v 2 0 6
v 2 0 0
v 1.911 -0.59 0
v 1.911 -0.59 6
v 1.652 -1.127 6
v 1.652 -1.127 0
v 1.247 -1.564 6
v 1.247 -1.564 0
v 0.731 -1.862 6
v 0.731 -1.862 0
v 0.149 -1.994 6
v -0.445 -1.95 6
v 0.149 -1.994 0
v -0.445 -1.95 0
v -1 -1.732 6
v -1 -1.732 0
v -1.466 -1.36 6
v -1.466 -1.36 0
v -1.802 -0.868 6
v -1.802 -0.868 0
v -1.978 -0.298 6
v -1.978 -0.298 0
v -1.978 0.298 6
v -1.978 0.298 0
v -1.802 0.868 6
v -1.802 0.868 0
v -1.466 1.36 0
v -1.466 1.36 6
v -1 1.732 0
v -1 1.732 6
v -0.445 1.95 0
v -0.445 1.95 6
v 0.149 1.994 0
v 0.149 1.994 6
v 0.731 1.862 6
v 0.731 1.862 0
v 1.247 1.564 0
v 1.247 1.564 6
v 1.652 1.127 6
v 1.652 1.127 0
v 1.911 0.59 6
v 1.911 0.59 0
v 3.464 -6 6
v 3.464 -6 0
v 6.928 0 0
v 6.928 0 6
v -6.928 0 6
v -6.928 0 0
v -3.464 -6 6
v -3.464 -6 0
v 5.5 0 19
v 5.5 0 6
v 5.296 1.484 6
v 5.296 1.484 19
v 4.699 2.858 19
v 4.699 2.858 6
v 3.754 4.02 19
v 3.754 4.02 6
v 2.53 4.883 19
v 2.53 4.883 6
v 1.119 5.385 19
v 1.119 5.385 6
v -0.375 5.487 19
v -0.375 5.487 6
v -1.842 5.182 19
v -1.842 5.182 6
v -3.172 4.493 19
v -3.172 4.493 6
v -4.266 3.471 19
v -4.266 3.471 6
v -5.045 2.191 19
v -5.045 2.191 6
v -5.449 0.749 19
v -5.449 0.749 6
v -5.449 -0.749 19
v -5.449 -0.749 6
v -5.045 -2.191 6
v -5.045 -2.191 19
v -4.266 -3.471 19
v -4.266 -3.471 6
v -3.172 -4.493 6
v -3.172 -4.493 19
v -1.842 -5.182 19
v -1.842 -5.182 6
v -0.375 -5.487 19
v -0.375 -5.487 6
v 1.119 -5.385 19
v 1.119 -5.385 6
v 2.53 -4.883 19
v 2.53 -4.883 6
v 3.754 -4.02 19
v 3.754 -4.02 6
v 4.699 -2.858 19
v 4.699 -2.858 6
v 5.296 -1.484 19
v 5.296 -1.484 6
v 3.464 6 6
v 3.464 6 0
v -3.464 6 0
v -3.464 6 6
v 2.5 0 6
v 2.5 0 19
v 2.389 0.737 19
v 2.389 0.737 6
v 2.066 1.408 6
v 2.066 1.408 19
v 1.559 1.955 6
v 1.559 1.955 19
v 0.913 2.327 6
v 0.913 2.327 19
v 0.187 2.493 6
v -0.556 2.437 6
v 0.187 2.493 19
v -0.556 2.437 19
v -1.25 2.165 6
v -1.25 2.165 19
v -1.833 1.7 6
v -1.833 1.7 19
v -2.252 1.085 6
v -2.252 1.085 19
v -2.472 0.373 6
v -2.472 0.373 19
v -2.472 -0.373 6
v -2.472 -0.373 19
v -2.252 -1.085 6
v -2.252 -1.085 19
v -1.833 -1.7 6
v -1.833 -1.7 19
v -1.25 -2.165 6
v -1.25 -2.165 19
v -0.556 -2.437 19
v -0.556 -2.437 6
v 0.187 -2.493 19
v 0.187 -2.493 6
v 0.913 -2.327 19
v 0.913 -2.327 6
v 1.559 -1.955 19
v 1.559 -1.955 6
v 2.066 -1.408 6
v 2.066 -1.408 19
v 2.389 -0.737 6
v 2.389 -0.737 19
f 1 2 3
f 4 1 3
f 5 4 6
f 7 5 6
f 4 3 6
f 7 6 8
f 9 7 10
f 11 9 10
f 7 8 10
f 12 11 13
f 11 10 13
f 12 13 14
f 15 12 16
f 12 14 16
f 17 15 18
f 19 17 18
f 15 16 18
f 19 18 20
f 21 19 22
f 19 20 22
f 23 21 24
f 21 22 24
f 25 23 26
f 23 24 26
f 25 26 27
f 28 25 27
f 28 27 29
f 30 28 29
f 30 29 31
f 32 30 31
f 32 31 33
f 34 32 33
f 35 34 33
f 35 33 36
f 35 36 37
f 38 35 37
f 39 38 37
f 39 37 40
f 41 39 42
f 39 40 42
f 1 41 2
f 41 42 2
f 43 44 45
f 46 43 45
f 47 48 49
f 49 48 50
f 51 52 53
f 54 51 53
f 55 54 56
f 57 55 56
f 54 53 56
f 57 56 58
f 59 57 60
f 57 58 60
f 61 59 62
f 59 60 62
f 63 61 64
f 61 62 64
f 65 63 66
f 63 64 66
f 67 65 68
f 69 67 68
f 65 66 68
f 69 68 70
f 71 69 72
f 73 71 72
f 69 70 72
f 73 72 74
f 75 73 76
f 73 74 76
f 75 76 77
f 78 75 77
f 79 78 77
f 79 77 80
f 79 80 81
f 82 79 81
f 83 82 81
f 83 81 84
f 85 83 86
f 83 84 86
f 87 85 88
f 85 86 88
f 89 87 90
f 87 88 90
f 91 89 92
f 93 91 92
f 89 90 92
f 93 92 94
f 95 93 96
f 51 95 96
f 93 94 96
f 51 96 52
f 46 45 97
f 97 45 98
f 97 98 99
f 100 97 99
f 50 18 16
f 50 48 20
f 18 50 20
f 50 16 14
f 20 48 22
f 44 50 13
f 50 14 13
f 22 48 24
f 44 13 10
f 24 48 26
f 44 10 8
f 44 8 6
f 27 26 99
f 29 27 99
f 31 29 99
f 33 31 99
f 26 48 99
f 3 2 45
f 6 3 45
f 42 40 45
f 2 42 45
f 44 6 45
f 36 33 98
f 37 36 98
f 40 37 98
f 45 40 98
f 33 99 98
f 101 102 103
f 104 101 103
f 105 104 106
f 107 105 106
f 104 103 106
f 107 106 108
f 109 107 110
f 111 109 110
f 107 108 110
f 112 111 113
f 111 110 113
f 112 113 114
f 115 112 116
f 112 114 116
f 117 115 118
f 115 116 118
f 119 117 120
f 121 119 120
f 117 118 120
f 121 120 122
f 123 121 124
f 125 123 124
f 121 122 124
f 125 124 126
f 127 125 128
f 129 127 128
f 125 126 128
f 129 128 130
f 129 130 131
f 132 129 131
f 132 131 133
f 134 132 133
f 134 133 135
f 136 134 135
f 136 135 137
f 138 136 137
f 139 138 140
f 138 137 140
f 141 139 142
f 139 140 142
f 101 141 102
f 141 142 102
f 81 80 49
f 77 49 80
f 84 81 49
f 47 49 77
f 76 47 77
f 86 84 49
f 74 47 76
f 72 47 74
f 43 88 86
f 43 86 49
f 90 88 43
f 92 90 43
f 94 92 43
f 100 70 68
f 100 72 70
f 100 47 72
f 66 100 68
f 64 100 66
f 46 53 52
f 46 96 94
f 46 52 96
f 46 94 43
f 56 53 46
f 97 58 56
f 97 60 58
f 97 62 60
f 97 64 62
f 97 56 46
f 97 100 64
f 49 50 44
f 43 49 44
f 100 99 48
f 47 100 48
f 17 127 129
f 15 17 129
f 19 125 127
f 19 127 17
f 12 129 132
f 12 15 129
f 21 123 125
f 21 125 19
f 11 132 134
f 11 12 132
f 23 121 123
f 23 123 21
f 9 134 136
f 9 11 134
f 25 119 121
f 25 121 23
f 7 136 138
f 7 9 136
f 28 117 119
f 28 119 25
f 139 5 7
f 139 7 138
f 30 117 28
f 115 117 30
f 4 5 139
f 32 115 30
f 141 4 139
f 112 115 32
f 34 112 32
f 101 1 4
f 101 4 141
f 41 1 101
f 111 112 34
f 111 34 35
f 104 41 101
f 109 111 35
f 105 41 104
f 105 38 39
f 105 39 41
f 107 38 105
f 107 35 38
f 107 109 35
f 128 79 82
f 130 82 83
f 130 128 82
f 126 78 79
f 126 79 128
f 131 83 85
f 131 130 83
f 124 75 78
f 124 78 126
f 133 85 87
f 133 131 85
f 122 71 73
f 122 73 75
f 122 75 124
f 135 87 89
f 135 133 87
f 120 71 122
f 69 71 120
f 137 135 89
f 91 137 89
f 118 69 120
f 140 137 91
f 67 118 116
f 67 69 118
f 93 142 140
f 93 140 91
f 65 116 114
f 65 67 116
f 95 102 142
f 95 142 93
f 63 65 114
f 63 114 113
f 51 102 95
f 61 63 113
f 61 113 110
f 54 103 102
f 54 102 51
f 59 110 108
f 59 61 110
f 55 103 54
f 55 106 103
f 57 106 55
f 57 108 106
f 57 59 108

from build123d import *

# Parameters (mm, degrees)
PAD_DEPTH       = 6
SKETCH001_R     = 5.5
PAD001_DEPTH    = 13
SKETCH002_R     = 2
POCKET_DEPTH    = 6
SKETCH003_R     = 2.5
POCKET001_DEPTH = 13


with BuildPart() as part:
    # Sketch → Pad (new body)
    with BuildSketch(Plane.XY):
        Polygon((6.928203, 0), (3.464102, 6), (-3.464102, 6), (-6.928203, 0), (-3.464102, -6), (3.464102, -6), align=None)
    extrude(amount=PAD_DEPTH)

    # Sketch001 (on Face8 of Pad) → Pad001 (join)
    with BuildSketch(Plane.XY.offset(6)):
        Circle(SKETCH001_R)
    extrude(amount=PAD001_DEPTH)

    # Sketch002 (on Face4 of Pad001) → Pocket (cut)
    with BuildSketch(Plane(origin=(0, 0, 0), x_dir=(1, 0, 0), z_dir=(0, 0, -1))):
        Circle(SKETCH002_R)
    extrude(amount=-POCKET_DEPTH, mode=Mode.SUBTRACT)

    # Sketch003 (on Face12 of Pocket) → Pocket001 (cut)
    with BuildSketch(Plane.XY.offset(19)):
        Circle(SKETCH003_R)
    extrude(amount=-POCKET001_DEPTH, mode=Mode.SUBTRACT)


solid = part.part
